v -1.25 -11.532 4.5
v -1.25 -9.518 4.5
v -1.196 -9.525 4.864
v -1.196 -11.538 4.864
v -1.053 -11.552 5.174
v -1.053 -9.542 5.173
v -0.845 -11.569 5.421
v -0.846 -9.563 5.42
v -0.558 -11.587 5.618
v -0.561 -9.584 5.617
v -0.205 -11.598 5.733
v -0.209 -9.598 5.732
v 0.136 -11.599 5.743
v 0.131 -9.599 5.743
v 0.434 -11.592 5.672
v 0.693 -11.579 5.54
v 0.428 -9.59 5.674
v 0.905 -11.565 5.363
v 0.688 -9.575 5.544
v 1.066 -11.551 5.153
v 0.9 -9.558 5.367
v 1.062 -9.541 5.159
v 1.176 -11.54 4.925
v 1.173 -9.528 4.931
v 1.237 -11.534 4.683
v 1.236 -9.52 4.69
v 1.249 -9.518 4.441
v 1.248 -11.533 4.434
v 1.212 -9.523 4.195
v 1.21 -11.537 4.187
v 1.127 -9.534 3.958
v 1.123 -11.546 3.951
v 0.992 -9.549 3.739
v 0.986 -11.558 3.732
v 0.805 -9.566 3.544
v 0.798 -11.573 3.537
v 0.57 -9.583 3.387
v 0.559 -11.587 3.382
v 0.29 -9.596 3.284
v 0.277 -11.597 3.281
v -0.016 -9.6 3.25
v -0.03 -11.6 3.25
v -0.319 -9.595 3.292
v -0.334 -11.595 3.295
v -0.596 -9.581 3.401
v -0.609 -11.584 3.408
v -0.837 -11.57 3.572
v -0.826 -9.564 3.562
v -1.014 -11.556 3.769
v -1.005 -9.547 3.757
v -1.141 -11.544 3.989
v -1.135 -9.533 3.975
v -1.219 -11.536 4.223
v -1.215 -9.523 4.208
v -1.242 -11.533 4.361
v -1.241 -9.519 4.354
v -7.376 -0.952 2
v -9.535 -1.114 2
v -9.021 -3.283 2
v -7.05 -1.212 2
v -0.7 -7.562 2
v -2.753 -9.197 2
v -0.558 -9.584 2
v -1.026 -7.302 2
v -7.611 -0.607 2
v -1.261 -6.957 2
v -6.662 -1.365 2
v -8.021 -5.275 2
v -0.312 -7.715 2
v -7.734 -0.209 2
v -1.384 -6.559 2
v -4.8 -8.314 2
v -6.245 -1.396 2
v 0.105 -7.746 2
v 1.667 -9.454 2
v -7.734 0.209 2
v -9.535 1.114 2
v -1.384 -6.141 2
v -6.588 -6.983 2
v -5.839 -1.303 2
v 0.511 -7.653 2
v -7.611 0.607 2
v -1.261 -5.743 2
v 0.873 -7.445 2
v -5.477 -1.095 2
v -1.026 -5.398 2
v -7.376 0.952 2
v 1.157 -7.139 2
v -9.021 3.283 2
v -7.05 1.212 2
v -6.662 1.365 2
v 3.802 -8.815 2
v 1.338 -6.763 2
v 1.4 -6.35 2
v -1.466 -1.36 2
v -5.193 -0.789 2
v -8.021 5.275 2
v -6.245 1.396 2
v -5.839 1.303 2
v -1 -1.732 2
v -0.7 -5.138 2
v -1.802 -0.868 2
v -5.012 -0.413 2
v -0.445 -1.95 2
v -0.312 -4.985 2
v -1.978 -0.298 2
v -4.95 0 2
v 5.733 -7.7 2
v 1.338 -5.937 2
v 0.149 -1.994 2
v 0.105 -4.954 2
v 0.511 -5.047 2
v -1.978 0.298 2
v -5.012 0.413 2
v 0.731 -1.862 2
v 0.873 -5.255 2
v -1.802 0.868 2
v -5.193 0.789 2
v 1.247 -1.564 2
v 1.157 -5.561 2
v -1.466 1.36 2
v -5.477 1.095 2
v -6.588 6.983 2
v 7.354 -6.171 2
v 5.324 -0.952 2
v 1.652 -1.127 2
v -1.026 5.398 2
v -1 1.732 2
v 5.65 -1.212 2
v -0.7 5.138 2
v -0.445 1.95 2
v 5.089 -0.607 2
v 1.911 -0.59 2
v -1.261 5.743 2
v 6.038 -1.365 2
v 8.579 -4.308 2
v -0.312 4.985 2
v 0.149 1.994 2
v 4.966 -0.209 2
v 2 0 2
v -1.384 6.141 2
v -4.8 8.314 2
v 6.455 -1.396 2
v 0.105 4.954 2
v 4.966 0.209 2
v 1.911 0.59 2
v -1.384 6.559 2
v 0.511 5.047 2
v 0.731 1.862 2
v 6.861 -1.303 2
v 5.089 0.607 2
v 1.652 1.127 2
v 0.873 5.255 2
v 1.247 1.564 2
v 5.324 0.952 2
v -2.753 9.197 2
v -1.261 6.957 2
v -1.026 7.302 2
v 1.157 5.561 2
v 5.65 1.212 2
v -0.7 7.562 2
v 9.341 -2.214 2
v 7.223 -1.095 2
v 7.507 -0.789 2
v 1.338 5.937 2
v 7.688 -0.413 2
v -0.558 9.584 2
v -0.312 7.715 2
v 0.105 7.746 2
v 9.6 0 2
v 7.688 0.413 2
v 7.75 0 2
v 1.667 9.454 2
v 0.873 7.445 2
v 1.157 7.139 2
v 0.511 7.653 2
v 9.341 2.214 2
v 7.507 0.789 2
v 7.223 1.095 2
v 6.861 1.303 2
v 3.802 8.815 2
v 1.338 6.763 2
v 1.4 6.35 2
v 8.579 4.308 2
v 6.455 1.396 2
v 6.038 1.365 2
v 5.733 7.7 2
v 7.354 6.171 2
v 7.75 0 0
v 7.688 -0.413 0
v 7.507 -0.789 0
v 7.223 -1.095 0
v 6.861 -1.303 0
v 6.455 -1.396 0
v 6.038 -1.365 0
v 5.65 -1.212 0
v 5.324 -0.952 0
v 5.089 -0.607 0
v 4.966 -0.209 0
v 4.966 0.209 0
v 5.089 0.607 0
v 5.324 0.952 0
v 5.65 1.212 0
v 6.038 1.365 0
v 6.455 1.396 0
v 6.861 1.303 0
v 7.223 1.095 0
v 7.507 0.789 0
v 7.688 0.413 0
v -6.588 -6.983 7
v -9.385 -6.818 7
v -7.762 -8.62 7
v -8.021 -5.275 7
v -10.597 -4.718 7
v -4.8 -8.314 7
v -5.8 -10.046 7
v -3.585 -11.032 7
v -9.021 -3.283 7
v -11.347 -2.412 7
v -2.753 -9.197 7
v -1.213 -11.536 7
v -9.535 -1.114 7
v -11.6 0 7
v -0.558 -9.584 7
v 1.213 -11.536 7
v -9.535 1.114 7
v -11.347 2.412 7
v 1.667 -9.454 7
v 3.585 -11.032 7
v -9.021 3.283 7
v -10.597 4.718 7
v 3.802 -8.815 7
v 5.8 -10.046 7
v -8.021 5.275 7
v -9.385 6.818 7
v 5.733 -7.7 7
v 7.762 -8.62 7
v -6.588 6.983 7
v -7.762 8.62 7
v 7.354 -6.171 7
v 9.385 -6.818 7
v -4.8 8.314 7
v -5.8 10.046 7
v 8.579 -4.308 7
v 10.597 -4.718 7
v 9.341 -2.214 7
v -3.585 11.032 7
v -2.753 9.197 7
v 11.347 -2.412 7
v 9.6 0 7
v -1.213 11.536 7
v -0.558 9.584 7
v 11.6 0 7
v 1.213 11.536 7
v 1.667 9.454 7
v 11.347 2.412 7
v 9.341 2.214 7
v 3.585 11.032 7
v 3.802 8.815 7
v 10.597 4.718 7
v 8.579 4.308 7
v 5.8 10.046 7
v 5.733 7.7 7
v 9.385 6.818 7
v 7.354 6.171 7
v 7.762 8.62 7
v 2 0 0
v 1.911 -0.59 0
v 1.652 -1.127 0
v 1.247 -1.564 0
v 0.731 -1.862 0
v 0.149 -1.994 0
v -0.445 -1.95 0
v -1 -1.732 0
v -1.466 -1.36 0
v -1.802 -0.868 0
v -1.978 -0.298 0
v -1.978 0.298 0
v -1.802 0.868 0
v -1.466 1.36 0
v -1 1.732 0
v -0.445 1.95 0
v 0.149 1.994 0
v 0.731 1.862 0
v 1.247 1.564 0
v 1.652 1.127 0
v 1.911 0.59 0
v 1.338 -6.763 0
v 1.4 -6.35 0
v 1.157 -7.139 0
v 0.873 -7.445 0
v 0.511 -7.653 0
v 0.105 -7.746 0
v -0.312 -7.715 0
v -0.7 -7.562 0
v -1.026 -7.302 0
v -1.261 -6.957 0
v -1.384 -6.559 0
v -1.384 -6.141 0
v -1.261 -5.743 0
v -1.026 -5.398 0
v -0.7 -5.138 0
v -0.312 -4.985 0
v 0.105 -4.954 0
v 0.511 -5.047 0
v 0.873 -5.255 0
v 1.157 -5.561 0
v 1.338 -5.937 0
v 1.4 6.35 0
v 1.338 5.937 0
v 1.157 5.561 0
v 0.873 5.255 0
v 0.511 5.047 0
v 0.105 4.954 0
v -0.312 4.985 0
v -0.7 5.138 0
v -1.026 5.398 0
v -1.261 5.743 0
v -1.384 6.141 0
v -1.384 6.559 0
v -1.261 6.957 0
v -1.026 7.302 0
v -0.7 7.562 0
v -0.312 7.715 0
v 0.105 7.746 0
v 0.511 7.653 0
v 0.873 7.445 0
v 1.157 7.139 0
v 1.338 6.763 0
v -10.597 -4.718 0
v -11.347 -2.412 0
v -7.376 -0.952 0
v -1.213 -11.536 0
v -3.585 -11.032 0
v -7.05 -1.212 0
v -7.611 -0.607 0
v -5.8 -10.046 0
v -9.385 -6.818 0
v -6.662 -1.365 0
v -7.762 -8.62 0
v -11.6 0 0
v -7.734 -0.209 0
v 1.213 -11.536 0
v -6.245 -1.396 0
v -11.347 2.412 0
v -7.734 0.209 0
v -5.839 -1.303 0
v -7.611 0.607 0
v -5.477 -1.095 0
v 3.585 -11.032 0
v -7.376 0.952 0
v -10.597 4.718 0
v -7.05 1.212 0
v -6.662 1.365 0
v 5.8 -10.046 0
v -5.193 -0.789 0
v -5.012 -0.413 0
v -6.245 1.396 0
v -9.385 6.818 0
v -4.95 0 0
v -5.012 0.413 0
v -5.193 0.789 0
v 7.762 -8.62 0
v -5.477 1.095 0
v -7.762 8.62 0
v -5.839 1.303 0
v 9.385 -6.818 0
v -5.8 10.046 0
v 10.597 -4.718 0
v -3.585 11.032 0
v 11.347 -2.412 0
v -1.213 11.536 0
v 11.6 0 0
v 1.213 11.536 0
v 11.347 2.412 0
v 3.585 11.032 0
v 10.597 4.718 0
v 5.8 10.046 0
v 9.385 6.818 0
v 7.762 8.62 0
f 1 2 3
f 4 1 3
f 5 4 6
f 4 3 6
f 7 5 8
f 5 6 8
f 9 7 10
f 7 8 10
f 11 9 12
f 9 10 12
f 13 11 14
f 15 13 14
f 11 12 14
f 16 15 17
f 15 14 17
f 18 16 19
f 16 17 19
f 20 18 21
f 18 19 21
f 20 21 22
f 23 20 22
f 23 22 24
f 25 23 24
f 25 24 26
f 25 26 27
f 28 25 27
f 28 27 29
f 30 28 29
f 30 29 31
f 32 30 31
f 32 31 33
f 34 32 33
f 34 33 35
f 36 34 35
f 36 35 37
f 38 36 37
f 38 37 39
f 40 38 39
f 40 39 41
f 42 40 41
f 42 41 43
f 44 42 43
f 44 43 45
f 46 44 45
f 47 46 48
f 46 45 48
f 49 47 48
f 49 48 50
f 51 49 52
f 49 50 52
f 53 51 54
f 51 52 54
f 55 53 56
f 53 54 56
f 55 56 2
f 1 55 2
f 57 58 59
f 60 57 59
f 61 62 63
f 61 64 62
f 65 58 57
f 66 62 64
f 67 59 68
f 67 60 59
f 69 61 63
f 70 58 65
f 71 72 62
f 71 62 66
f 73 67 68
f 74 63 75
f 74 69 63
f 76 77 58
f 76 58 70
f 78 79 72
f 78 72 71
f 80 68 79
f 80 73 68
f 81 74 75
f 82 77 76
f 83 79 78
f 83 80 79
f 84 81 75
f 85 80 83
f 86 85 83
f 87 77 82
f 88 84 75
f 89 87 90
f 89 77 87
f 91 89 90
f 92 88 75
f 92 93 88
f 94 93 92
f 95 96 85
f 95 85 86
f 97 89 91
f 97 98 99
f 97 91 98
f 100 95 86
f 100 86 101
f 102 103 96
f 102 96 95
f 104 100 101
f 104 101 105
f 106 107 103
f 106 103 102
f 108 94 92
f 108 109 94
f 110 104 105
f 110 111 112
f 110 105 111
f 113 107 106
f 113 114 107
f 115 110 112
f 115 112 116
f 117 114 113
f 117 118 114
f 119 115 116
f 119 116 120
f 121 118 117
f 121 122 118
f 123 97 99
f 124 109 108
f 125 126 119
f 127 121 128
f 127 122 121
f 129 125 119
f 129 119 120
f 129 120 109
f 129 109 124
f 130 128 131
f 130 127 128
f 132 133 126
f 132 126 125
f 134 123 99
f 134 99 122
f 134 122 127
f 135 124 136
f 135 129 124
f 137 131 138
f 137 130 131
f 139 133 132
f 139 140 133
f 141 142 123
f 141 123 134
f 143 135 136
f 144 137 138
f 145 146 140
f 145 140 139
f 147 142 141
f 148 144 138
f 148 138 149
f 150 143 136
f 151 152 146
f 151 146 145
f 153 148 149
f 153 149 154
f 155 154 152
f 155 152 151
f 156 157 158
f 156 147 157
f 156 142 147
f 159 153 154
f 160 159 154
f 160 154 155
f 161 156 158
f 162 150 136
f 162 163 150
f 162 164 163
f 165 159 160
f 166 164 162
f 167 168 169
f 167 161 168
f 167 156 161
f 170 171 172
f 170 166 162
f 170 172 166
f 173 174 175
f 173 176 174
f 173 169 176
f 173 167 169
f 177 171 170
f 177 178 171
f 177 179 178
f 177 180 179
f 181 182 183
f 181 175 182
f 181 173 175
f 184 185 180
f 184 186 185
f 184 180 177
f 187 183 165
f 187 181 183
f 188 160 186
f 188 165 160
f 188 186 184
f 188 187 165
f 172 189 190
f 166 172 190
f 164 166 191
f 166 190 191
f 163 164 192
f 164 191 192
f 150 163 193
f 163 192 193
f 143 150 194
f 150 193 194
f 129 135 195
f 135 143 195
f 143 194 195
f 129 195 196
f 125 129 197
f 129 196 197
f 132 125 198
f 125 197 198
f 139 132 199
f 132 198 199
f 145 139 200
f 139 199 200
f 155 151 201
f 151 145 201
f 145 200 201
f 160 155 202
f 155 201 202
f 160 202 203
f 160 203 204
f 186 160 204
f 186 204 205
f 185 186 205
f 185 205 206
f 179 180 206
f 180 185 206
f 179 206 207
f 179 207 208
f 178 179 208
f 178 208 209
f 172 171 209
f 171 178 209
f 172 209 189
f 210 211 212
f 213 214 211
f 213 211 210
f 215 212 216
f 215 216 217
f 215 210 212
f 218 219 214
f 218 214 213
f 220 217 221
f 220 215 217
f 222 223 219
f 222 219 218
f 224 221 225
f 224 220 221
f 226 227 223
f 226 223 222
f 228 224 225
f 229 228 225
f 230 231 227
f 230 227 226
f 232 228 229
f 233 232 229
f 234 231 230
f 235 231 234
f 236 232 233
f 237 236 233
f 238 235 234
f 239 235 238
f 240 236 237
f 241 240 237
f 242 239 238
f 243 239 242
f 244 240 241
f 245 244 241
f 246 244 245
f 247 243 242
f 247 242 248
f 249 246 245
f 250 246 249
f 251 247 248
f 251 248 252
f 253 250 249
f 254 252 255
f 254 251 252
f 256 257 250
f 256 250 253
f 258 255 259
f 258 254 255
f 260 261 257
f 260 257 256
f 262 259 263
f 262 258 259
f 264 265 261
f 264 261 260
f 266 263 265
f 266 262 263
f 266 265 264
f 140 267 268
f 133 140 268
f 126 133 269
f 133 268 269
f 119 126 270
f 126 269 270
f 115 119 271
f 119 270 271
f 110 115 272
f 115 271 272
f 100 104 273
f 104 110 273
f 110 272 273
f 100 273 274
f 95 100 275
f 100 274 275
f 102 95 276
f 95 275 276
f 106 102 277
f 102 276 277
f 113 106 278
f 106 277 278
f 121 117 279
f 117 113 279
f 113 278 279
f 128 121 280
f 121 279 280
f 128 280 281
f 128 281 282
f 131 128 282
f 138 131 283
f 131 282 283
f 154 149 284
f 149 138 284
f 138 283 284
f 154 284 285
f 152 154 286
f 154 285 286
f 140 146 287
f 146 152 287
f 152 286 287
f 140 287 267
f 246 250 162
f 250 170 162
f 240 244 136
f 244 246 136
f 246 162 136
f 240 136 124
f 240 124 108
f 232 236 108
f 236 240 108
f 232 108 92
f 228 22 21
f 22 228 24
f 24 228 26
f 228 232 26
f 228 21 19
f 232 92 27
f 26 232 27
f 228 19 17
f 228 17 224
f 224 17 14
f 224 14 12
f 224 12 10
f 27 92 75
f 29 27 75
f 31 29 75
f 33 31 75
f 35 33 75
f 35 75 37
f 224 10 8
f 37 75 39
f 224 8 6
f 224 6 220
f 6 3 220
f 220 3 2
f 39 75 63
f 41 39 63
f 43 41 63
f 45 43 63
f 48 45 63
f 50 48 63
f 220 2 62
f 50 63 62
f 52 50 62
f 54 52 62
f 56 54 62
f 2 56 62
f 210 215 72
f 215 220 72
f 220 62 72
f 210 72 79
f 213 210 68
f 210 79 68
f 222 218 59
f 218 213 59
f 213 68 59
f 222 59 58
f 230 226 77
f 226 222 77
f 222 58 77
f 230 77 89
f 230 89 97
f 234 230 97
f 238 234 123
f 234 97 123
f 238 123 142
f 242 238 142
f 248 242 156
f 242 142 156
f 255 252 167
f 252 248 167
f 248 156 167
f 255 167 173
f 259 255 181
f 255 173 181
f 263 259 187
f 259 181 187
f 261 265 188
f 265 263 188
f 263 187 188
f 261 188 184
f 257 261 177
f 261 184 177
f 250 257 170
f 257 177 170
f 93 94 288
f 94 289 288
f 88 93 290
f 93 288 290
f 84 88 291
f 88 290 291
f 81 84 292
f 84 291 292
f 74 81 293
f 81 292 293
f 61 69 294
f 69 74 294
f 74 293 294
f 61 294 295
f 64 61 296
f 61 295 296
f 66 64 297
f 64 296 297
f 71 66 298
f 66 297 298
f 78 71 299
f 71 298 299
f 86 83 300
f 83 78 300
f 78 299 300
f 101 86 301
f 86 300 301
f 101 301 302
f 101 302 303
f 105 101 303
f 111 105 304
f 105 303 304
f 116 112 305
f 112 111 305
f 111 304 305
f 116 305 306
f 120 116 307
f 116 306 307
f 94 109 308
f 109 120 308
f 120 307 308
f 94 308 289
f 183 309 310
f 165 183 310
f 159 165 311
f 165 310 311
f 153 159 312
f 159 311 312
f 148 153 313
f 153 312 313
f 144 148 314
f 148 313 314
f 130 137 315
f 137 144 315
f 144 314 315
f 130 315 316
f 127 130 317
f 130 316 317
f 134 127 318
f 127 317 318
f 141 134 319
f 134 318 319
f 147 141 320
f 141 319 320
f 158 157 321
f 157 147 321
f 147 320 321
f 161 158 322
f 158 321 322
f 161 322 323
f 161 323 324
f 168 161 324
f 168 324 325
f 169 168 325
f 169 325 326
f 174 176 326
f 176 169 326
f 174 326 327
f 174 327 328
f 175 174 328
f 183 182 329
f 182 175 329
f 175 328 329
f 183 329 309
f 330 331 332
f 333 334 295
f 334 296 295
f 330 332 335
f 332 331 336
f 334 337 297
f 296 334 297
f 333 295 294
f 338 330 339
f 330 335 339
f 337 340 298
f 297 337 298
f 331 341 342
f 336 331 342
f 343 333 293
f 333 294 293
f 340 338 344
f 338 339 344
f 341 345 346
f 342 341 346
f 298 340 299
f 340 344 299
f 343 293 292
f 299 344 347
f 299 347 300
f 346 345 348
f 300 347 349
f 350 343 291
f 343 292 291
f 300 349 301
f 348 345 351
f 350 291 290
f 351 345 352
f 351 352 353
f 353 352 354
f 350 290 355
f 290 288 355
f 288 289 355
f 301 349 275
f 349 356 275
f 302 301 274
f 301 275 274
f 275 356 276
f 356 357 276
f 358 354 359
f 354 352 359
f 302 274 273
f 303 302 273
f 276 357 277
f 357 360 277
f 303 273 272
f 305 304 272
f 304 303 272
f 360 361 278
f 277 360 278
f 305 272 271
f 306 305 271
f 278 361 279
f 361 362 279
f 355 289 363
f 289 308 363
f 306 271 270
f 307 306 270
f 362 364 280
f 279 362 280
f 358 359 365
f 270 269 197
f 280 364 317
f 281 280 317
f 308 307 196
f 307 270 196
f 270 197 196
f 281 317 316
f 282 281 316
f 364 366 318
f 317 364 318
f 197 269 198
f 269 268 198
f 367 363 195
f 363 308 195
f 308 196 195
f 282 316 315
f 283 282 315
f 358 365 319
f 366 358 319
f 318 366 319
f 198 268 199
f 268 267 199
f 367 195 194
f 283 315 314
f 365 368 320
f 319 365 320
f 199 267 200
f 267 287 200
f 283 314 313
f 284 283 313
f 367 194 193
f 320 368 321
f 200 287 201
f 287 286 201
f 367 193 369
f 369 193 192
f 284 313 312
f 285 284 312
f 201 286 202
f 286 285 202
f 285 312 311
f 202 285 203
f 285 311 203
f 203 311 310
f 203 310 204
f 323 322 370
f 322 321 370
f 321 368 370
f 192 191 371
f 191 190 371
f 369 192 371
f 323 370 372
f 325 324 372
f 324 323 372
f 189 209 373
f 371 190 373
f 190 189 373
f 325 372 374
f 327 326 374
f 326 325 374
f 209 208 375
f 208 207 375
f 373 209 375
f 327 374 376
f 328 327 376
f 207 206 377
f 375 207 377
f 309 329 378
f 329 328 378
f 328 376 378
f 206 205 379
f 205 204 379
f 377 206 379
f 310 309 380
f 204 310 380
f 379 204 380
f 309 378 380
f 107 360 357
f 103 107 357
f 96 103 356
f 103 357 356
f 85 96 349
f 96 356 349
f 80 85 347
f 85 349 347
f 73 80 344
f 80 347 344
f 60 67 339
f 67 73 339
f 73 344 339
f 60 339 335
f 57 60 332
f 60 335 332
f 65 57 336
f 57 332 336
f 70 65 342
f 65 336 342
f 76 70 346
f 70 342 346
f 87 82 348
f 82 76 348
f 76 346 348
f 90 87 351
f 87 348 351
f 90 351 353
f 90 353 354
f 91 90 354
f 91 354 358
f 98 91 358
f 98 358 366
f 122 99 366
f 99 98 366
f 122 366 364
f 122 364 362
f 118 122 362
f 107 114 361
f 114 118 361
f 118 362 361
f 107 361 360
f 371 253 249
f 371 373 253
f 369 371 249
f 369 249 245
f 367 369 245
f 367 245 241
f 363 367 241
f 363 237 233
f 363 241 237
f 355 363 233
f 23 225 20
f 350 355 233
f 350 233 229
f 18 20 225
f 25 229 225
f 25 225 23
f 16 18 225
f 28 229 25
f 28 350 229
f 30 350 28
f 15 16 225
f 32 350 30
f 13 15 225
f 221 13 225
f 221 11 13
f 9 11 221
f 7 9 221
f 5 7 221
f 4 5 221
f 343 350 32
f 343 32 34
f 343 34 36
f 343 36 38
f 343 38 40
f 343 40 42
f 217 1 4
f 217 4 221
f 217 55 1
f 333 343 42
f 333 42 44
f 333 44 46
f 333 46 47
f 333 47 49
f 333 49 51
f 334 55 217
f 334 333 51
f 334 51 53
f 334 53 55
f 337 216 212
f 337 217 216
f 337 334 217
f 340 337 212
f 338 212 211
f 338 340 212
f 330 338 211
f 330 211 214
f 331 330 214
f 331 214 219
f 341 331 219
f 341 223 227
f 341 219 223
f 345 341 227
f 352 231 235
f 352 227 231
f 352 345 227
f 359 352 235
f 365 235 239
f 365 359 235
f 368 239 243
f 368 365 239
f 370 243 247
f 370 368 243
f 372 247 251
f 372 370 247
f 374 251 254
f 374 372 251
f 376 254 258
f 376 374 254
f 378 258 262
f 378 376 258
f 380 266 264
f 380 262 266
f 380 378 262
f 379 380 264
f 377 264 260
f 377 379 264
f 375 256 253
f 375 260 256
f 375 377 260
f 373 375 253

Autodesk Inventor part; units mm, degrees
ref_plane "YZ Plane" through (0, 0, 0) normal (1, 0, 0) x (0, 1, 0)
ref_plane "XZ Plane" through (0, 0, 0) normal (0, 1, 0) x (-1, 0, 0)
ref_plane "XY Plane" through (0, 0, 0) normal (0, 0, 1) x (1, 0, 0)
sketch "Skizze1" plane through (0, 0, 0) normal (0, 0, 1) x (1, 0, 0)
  circle A0 centre (0, 0) radius 2
  circle A1 centre (0, 0) radius 9.6
  circle A2 centre (0, 0) radius 6.35 construction
  circle A3 centre (6.35, 0) radius 1.4
  circle A4 centre (-6.35, 0) radius 1.4
  circle A5 centre (0, 6.35) radius 1.4
  circle A6 centre (0, -6.35) radius 1.4
  circle A7 centre (0, 0) radius 11.6
  circle A8 centre (0, 0) radius 4.3516
  line L0 (0, 16.24) -> (0, -16.24) construction
  line L1 (-16.24, 0) -> (16.24, 0) construction
  dimension "d0" = 19.2
  dimension "d1" = 12.7
  dimension "d2" = 2.8
  dimension "d3" = 4
  dimension "d4" = 2
  dimension "d5" = 8.7031
extrude "Extrusion1" add sketch "Skizze1" along normal blind 2 contours A1 | A7 | A8
extrude "Extrusion2" add sketch "Skizze1" along normal blind 5 from surface at 2 contours A7
sketch "Skizze2" plane through (0, 0, 0) normal (0, 1, 0) x (-1, 0, 0)
  circle A0 centre (0, 4.5) radius 1.25
  line L0 (9.6, 7) -> (-9.6, 7) projected
  point P0 (0, 0)
  dimension "d10" = 2.5
  dimension "d11" = 2.5
extrude "Extrusion3" cut sketch "Skizze2" against normal through all
properties part number "Input"
